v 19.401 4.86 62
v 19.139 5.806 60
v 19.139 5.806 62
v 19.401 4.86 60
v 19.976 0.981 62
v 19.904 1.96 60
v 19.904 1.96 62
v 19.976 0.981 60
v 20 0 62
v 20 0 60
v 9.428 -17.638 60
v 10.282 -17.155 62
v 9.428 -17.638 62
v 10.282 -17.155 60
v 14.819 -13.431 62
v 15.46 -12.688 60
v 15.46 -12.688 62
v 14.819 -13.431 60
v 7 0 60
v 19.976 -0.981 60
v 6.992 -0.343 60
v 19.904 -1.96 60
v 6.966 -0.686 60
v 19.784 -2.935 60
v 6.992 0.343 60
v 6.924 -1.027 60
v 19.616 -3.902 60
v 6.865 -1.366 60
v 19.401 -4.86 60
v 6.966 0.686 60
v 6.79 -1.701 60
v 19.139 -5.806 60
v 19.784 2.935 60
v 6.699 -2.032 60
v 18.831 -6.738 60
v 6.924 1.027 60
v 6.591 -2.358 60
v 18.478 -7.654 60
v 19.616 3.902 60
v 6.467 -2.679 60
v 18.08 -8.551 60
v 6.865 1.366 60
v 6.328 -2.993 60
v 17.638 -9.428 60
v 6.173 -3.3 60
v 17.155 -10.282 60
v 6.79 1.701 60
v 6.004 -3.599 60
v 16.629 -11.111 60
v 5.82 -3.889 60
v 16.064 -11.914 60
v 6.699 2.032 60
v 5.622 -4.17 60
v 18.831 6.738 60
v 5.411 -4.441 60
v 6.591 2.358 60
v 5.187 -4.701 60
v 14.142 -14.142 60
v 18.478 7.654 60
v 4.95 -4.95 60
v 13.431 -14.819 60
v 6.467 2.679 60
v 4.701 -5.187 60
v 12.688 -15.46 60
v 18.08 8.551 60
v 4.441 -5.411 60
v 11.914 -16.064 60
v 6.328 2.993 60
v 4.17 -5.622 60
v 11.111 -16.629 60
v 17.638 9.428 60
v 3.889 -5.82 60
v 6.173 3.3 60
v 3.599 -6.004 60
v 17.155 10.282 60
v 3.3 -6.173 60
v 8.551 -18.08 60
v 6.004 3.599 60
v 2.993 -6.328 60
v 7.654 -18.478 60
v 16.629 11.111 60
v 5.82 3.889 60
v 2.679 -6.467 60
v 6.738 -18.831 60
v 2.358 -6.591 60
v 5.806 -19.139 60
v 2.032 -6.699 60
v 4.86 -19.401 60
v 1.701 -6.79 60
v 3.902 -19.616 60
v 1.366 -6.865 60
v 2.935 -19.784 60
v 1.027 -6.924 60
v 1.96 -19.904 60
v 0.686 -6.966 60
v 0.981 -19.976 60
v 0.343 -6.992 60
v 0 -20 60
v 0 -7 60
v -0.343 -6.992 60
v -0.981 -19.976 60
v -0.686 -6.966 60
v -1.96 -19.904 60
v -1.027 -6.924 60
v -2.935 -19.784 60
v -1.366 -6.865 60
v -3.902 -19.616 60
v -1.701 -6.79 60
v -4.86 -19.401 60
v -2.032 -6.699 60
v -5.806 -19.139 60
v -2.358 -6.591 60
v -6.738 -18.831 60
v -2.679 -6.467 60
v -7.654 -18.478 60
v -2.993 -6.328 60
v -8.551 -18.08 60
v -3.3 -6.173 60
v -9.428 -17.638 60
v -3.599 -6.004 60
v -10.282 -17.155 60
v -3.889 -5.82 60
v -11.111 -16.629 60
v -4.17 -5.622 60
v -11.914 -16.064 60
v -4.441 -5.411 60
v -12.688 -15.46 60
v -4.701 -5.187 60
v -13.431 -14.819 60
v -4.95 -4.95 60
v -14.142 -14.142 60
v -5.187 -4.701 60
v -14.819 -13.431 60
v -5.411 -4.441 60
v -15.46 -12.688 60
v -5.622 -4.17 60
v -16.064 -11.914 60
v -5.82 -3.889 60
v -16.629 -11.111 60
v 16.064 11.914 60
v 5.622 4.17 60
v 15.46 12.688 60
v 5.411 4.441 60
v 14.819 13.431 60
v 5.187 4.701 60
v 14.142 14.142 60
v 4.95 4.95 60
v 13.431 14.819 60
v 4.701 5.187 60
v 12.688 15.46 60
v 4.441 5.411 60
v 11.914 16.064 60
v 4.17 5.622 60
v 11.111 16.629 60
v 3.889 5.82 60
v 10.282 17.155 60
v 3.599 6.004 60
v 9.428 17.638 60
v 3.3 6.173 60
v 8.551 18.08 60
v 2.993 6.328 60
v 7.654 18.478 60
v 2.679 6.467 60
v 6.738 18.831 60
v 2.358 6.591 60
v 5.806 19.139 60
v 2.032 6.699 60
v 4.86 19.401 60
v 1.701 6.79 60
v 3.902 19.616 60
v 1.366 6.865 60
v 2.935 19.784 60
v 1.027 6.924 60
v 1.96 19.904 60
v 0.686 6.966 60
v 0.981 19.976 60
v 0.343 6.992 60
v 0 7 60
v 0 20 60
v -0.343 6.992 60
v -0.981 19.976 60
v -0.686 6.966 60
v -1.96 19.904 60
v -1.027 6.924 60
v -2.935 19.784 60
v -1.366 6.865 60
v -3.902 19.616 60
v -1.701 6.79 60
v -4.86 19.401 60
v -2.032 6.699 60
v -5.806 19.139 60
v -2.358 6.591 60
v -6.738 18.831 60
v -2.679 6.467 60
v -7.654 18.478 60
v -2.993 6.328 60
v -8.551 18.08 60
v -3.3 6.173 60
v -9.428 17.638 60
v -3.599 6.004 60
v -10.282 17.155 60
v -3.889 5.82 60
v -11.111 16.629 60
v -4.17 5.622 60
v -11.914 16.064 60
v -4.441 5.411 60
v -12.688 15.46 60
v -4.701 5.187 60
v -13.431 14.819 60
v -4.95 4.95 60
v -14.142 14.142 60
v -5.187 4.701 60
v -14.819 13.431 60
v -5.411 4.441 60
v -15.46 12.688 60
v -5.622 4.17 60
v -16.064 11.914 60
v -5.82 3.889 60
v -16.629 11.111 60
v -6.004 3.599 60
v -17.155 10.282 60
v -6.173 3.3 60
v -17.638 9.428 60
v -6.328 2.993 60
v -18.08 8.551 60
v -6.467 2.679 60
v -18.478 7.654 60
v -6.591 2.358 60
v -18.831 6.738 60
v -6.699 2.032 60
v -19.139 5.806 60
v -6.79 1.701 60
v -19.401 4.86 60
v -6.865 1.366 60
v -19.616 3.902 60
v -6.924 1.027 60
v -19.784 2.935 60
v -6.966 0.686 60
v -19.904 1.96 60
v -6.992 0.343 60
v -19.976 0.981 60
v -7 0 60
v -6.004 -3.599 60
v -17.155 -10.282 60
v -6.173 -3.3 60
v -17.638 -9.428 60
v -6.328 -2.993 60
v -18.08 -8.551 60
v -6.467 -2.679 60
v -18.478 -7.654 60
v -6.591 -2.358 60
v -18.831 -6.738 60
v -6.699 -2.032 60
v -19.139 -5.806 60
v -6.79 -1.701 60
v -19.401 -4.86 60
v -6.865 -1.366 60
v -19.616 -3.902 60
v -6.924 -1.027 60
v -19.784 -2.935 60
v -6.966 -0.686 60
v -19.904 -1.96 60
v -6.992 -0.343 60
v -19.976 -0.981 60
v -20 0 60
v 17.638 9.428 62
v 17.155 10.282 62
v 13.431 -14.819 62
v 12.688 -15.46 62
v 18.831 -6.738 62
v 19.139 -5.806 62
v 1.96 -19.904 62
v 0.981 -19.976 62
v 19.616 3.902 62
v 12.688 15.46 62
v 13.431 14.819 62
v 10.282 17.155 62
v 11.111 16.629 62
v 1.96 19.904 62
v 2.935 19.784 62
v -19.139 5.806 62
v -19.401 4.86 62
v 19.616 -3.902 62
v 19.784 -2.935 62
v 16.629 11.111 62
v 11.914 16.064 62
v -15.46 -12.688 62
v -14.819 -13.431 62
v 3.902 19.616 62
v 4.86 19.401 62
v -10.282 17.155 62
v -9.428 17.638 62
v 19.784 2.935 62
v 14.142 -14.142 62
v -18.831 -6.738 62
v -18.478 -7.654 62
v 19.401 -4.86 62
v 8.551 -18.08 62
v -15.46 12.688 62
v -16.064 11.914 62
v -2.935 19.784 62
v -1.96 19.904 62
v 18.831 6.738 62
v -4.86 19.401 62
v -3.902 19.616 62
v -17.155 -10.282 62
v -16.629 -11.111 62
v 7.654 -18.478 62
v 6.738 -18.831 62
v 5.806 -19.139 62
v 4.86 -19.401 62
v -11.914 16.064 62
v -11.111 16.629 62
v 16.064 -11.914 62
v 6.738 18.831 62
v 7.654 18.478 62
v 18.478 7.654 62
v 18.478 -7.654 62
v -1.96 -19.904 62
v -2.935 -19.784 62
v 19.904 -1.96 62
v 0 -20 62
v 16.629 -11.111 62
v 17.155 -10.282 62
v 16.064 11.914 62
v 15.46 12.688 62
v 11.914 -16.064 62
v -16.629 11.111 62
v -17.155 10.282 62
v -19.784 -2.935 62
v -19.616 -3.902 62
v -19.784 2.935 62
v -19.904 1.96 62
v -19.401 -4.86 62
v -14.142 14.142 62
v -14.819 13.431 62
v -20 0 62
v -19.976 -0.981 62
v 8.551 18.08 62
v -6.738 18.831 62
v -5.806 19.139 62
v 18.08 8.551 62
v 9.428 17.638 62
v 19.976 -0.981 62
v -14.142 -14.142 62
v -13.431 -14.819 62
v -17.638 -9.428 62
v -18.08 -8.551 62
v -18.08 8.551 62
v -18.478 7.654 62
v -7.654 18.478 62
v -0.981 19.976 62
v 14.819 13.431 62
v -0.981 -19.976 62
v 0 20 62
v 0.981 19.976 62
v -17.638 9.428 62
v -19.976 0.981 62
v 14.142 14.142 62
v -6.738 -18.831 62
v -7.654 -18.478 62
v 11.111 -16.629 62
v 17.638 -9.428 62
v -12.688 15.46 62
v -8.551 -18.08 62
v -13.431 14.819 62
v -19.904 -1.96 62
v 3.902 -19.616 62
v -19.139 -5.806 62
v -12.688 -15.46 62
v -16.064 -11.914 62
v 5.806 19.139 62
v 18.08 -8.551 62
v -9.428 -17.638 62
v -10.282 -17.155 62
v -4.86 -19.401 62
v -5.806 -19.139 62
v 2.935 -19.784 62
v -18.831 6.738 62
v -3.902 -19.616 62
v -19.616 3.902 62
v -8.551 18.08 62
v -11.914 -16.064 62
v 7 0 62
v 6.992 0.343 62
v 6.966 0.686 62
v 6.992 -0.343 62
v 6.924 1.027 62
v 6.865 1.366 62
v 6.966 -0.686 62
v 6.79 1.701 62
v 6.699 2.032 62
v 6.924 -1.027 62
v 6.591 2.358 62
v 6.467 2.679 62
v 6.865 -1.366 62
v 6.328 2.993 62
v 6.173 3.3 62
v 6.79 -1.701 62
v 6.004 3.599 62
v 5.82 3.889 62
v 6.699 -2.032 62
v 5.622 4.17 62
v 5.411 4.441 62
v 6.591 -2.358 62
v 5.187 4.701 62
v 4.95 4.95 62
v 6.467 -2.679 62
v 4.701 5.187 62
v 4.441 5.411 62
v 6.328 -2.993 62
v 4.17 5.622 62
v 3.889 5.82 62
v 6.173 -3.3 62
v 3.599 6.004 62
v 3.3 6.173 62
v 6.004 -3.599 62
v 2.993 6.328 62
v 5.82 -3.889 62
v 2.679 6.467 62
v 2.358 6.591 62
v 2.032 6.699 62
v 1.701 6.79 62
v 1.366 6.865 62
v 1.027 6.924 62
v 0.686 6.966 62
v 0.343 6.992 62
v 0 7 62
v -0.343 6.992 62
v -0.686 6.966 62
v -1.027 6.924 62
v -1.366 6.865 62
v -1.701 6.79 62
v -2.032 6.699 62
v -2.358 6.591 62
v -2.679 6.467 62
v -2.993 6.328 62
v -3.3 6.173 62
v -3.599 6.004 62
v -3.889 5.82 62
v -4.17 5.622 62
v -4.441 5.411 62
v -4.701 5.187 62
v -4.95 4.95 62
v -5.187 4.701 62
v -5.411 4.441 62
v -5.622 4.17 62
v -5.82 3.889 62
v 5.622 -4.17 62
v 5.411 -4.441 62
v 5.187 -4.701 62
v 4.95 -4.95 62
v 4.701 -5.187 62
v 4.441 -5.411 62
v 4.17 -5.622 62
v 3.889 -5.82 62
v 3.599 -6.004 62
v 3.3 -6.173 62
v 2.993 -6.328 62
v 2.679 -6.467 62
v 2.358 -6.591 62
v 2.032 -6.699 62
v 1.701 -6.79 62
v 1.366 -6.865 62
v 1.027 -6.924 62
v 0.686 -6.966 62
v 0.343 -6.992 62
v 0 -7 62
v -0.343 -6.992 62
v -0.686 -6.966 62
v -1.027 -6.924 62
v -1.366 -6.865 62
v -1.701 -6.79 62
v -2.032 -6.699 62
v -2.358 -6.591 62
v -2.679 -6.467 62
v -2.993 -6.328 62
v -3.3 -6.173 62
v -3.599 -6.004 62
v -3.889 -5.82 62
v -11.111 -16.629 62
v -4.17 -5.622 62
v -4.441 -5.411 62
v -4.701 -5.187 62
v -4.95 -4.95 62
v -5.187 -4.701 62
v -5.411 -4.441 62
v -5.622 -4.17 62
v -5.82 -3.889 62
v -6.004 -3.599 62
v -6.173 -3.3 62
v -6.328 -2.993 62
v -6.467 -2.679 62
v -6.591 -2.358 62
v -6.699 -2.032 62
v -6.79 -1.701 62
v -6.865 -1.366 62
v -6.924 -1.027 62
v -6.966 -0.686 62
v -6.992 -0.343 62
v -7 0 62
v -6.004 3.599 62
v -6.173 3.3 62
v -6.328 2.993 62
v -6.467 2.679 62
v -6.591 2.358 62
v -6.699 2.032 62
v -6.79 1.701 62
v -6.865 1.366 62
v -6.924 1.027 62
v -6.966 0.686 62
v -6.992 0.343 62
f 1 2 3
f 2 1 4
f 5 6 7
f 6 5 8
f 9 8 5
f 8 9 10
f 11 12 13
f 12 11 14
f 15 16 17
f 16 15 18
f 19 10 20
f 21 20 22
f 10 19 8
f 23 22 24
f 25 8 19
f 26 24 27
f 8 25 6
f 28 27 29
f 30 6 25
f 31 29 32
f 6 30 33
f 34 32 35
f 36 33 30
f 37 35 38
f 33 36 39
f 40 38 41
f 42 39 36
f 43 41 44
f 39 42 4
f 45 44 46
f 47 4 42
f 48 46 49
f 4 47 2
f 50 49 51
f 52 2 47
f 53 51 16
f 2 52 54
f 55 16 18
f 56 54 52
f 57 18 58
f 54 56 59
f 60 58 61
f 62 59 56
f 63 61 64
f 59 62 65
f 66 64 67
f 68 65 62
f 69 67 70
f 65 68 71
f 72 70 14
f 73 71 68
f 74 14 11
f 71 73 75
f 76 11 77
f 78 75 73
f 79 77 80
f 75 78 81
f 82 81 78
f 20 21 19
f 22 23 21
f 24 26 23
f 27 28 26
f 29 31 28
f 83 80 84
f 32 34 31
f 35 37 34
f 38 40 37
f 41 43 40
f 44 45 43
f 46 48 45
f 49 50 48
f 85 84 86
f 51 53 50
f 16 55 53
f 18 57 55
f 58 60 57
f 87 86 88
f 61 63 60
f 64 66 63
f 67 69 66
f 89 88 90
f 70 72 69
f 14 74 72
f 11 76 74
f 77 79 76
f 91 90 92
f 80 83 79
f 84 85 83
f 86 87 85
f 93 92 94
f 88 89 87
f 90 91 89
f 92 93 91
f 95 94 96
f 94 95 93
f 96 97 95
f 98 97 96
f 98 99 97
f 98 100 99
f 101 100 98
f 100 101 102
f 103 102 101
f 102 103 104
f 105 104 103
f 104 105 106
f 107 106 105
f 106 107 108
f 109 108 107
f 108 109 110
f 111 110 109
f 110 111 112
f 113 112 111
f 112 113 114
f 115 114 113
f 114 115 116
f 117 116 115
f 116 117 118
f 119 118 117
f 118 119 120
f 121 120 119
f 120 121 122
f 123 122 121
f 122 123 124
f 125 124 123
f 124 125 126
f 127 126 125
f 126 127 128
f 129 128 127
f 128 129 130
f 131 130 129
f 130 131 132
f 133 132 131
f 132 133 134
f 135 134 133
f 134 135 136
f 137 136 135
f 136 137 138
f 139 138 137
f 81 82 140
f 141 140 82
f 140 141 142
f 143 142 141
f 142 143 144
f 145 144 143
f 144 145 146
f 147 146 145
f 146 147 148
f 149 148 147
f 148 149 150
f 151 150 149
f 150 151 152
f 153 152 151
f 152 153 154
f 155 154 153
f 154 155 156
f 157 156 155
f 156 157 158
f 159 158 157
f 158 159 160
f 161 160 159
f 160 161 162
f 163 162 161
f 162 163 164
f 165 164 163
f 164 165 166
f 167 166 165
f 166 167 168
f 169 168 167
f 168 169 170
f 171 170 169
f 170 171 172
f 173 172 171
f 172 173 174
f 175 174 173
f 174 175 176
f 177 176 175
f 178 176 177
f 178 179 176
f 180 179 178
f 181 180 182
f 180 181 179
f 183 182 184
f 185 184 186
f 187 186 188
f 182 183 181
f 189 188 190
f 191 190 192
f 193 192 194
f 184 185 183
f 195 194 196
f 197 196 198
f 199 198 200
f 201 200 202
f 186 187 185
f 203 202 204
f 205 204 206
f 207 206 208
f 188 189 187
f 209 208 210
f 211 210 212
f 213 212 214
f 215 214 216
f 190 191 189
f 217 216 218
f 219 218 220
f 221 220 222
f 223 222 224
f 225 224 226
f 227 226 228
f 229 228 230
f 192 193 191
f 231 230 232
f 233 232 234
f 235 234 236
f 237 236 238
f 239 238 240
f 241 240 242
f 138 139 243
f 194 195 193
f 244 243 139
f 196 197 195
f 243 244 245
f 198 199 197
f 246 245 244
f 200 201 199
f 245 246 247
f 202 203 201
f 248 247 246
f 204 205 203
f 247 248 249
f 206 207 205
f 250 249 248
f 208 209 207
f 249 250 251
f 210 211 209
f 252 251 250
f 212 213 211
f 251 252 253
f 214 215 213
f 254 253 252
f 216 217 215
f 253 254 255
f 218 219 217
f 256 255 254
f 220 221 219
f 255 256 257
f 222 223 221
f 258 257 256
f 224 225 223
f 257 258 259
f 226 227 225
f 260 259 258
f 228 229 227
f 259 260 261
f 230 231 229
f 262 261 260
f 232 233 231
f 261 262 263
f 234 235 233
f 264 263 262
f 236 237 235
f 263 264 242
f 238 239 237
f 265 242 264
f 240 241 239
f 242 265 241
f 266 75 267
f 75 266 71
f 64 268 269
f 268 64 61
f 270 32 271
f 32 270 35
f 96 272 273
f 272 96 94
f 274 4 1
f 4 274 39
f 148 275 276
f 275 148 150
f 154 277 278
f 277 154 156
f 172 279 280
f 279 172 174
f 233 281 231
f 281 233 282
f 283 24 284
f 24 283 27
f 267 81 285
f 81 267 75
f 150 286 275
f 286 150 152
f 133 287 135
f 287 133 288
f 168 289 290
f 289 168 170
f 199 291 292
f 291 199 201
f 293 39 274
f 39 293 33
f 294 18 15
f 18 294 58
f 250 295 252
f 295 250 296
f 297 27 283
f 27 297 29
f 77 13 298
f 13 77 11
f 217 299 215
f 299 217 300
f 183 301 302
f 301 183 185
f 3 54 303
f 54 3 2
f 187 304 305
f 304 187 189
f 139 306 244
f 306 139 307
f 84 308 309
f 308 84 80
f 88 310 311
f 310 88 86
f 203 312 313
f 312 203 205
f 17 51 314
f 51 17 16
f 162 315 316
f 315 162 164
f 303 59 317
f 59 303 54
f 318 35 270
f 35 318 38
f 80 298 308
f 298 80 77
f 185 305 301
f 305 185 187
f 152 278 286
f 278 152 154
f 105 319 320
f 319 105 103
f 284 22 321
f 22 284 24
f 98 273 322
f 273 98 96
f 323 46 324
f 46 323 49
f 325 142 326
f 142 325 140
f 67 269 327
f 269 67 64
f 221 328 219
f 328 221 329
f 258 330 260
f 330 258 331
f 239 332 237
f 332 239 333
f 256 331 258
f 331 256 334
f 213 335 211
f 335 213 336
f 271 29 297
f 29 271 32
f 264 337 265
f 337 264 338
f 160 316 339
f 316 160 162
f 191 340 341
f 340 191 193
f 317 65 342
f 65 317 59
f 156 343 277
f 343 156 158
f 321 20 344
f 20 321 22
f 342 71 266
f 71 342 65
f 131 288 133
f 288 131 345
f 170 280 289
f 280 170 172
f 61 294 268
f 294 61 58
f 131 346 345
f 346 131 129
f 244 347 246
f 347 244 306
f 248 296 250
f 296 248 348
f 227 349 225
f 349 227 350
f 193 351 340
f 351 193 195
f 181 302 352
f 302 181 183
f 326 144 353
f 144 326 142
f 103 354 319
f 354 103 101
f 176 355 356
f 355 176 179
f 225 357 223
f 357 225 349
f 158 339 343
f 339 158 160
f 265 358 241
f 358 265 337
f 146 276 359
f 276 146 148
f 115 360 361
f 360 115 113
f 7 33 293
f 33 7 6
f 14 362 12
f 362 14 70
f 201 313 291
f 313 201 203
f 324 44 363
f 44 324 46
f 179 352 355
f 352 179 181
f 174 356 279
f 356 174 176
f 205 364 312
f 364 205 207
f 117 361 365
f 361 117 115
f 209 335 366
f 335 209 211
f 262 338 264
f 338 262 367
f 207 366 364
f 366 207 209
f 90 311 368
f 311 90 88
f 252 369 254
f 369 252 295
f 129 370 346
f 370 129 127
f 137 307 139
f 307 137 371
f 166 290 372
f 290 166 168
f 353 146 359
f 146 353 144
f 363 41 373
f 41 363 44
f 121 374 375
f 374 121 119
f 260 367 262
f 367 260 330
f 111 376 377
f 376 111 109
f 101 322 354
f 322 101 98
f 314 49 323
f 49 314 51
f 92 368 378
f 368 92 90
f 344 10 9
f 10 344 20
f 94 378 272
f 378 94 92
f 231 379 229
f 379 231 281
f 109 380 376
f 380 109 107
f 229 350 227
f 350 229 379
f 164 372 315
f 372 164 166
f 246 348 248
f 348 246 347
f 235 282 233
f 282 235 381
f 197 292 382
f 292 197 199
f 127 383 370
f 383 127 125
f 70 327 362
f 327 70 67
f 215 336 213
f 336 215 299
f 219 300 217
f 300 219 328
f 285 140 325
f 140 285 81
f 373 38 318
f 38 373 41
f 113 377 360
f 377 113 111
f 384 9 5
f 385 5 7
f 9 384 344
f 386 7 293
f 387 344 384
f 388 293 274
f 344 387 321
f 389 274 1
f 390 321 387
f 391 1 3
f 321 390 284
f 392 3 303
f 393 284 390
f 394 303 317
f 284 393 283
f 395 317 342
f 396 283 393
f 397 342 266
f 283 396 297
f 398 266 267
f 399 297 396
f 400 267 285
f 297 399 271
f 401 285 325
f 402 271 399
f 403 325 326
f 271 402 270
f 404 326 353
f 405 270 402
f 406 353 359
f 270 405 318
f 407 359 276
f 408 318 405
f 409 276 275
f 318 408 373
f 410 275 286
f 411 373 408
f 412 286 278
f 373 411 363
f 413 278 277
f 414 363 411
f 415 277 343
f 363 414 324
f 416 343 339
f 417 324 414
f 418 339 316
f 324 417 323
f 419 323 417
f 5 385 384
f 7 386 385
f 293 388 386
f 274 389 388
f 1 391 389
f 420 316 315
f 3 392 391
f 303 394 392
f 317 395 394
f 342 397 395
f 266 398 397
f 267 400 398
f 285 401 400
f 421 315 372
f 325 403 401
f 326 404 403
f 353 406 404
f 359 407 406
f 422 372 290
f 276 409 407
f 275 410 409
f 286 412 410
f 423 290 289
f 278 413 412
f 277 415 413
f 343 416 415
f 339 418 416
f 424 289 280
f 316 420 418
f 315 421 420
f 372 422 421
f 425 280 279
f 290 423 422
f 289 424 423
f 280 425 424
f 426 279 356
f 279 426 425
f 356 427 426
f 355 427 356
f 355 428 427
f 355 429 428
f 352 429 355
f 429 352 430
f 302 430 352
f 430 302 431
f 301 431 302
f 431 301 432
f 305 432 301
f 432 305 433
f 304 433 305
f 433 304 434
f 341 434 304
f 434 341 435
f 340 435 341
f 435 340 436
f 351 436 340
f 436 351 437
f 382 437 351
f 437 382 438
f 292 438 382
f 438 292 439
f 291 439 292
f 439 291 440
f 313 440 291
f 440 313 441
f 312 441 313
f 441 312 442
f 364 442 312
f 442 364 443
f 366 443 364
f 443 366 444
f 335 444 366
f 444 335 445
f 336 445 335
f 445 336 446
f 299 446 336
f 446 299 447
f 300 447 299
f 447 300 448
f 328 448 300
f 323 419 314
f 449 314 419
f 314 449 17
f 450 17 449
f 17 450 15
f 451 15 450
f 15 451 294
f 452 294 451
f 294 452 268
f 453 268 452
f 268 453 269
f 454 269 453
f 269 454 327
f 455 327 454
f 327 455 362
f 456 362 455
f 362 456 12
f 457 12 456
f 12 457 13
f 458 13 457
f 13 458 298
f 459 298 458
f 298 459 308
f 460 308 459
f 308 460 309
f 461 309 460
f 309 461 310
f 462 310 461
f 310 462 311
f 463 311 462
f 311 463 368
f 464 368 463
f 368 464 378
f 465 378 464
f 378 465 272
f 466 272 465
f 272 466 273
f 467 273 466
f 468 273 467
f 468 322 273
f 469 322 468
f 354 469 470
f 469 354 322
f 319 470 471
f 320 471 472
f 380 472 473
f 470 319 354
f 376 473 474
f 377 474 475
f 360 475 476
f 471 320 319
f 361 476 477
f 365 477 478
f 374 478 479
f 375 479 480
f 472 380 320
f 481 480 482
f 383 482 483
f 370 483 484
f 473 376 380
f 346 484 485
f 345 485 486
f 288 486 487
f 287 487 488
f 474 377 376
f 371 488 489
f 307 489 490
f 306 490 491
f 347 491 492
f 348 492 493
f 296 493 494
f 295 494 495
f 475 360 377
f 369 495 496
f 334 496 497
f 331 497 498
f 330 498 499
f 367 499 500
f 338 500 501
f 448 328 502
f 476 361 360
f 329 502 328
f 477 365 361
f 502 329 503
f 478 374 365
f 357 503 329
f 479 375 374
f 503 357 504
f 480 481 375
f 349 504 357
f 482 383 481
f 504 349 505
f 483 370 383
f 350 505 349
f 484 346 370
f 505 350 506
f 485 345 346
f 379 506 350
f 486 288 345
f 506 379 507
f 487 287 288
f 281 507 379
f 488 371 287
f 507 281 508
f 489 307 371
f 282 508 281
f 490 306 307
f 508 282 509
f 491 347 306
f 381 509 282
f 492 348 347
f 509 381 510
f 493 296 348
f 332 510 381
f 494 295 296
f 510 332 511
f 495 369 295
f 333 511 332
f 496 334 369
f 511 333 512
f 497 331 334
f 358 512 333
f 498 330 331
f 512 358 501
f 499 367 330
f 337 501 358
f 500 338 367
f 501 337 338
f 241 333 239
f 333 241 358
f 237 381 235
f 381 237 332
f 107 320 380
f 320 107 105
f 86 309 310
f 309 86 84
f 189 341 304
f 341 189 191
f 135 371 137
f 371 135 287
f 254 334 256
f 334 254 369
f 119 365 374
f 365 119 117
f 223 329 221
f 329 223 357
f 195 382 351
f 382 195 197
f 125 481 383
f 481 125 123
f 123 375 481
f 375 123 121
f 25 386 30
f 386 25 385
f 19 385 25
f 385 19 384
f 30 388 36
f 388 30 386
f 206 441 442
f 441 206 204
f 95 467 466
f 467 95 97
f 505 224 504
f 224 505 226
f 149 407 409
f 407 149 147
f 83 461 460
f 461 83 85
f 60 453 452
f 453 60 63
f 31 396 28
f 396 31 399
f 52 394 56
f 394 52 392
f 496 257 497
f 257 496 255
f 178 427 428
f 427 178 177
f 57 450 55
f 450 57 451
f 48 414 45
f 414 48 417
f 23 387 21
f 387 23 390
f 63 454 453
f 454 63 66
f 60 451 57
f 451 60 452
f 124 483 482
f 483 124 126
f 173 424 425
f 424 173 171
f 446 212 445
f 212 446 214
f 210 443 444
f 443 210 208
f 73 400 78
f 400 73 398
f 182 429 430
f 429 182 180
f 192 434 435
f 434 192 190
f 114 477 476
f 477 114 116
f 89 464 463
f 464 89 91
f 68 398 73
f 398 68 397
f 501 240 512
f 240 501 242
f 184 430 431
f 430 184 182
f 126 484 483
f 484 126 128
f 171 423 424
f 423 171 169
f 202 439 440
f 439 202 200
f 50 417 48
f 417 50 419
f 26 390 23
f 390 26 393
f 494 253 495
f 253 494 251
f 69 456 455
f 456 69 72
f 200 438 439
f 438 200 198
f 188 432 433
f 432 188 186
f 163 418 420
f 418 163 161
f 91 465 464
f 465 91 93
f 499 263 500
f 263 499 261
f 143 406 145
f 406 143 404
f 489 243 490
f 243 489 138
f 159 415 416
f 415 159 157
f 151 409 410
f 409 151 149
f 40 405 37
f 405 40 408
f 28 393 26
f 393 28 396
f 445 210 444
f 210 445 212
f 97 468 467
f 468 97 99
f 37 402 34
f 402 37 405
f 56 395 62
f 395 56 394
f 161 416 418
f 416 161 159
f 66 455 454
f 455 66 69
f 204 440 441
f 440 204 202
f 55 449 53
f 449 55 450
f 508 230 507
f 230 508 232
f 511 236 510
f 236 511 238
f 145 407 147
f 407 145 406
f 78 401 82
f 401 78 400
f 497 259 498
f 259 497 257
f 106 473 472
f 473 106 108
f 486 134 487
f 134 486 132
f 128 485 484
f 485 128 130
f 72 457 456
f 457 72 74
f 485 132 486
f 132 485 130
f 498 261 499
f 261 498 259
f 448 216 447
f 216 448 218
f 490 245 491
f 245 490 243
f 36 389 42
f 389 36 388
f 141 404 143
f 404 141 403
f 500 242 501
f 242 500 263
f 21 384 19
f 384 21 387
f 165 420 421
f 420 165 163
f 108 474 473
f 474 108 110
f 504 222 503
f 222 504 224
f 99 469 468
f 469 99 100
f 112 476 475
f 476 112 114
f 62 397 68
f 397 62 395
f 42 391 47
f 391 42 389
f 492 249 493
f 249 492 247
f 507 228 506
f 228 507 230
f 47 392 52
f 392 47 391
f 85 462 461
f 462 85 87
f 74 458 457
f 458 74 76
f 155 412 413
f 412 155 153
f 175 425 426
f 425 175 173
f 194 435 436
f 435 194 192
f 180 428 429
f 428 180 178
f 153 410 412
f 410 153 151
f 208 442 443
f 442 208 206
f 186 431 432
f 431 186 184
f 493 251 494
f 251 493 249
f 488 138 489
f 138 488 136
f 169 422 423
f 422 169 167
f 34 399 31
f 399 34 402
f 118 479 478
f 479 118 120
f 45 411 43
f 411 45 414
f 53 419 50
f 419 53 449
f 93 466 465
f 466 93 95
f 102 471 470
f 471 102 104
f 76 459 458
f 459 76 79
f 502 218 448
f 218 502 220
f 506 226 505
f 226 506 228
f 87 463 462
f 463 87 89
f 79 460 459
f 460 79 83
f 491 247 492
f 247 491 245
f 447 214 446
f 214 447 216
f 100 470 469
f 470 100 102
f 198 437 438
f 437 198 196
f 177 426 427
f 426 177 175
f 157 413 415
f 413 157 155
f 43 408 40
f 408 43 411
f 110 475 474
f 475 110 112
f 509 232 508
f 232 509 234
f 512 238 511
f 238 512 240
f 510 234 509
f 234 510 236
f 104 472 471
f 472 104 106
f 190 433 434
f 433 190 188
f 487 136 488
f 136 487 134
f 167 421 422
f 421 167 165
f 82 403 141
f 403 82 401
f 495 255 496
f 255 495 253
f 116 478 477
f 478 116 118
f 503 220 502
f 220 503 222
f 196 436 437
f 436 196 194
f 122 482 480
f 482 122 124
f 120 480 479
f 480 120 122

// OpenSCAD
// file: common_params.scad
cylinder_radius = 20.000000;
cylinder_height = 60.000000;
wall_thickness = 2.000000;

cap_thickness = 2.000000;

rod_radius = 2.000000;
rod_height = 50.000000;

ring_outer_radius = 8.000000;
ring_inner_radius = 4.000000;
ring_thickness = 3.000000;
ring_z = 40.000000;

$fn = 128;
// main file
include <common_params.scad>;

hole_radius = 7.000000;

translate([0, 0, cylinder_height])
difference() {
    cylinder(h = cap_thickness, r = cylinder_radius);
    translate([0, 0, -0.1])
        cylinder(h = cap_thickness + 0.2, r = hole_radius);
}
